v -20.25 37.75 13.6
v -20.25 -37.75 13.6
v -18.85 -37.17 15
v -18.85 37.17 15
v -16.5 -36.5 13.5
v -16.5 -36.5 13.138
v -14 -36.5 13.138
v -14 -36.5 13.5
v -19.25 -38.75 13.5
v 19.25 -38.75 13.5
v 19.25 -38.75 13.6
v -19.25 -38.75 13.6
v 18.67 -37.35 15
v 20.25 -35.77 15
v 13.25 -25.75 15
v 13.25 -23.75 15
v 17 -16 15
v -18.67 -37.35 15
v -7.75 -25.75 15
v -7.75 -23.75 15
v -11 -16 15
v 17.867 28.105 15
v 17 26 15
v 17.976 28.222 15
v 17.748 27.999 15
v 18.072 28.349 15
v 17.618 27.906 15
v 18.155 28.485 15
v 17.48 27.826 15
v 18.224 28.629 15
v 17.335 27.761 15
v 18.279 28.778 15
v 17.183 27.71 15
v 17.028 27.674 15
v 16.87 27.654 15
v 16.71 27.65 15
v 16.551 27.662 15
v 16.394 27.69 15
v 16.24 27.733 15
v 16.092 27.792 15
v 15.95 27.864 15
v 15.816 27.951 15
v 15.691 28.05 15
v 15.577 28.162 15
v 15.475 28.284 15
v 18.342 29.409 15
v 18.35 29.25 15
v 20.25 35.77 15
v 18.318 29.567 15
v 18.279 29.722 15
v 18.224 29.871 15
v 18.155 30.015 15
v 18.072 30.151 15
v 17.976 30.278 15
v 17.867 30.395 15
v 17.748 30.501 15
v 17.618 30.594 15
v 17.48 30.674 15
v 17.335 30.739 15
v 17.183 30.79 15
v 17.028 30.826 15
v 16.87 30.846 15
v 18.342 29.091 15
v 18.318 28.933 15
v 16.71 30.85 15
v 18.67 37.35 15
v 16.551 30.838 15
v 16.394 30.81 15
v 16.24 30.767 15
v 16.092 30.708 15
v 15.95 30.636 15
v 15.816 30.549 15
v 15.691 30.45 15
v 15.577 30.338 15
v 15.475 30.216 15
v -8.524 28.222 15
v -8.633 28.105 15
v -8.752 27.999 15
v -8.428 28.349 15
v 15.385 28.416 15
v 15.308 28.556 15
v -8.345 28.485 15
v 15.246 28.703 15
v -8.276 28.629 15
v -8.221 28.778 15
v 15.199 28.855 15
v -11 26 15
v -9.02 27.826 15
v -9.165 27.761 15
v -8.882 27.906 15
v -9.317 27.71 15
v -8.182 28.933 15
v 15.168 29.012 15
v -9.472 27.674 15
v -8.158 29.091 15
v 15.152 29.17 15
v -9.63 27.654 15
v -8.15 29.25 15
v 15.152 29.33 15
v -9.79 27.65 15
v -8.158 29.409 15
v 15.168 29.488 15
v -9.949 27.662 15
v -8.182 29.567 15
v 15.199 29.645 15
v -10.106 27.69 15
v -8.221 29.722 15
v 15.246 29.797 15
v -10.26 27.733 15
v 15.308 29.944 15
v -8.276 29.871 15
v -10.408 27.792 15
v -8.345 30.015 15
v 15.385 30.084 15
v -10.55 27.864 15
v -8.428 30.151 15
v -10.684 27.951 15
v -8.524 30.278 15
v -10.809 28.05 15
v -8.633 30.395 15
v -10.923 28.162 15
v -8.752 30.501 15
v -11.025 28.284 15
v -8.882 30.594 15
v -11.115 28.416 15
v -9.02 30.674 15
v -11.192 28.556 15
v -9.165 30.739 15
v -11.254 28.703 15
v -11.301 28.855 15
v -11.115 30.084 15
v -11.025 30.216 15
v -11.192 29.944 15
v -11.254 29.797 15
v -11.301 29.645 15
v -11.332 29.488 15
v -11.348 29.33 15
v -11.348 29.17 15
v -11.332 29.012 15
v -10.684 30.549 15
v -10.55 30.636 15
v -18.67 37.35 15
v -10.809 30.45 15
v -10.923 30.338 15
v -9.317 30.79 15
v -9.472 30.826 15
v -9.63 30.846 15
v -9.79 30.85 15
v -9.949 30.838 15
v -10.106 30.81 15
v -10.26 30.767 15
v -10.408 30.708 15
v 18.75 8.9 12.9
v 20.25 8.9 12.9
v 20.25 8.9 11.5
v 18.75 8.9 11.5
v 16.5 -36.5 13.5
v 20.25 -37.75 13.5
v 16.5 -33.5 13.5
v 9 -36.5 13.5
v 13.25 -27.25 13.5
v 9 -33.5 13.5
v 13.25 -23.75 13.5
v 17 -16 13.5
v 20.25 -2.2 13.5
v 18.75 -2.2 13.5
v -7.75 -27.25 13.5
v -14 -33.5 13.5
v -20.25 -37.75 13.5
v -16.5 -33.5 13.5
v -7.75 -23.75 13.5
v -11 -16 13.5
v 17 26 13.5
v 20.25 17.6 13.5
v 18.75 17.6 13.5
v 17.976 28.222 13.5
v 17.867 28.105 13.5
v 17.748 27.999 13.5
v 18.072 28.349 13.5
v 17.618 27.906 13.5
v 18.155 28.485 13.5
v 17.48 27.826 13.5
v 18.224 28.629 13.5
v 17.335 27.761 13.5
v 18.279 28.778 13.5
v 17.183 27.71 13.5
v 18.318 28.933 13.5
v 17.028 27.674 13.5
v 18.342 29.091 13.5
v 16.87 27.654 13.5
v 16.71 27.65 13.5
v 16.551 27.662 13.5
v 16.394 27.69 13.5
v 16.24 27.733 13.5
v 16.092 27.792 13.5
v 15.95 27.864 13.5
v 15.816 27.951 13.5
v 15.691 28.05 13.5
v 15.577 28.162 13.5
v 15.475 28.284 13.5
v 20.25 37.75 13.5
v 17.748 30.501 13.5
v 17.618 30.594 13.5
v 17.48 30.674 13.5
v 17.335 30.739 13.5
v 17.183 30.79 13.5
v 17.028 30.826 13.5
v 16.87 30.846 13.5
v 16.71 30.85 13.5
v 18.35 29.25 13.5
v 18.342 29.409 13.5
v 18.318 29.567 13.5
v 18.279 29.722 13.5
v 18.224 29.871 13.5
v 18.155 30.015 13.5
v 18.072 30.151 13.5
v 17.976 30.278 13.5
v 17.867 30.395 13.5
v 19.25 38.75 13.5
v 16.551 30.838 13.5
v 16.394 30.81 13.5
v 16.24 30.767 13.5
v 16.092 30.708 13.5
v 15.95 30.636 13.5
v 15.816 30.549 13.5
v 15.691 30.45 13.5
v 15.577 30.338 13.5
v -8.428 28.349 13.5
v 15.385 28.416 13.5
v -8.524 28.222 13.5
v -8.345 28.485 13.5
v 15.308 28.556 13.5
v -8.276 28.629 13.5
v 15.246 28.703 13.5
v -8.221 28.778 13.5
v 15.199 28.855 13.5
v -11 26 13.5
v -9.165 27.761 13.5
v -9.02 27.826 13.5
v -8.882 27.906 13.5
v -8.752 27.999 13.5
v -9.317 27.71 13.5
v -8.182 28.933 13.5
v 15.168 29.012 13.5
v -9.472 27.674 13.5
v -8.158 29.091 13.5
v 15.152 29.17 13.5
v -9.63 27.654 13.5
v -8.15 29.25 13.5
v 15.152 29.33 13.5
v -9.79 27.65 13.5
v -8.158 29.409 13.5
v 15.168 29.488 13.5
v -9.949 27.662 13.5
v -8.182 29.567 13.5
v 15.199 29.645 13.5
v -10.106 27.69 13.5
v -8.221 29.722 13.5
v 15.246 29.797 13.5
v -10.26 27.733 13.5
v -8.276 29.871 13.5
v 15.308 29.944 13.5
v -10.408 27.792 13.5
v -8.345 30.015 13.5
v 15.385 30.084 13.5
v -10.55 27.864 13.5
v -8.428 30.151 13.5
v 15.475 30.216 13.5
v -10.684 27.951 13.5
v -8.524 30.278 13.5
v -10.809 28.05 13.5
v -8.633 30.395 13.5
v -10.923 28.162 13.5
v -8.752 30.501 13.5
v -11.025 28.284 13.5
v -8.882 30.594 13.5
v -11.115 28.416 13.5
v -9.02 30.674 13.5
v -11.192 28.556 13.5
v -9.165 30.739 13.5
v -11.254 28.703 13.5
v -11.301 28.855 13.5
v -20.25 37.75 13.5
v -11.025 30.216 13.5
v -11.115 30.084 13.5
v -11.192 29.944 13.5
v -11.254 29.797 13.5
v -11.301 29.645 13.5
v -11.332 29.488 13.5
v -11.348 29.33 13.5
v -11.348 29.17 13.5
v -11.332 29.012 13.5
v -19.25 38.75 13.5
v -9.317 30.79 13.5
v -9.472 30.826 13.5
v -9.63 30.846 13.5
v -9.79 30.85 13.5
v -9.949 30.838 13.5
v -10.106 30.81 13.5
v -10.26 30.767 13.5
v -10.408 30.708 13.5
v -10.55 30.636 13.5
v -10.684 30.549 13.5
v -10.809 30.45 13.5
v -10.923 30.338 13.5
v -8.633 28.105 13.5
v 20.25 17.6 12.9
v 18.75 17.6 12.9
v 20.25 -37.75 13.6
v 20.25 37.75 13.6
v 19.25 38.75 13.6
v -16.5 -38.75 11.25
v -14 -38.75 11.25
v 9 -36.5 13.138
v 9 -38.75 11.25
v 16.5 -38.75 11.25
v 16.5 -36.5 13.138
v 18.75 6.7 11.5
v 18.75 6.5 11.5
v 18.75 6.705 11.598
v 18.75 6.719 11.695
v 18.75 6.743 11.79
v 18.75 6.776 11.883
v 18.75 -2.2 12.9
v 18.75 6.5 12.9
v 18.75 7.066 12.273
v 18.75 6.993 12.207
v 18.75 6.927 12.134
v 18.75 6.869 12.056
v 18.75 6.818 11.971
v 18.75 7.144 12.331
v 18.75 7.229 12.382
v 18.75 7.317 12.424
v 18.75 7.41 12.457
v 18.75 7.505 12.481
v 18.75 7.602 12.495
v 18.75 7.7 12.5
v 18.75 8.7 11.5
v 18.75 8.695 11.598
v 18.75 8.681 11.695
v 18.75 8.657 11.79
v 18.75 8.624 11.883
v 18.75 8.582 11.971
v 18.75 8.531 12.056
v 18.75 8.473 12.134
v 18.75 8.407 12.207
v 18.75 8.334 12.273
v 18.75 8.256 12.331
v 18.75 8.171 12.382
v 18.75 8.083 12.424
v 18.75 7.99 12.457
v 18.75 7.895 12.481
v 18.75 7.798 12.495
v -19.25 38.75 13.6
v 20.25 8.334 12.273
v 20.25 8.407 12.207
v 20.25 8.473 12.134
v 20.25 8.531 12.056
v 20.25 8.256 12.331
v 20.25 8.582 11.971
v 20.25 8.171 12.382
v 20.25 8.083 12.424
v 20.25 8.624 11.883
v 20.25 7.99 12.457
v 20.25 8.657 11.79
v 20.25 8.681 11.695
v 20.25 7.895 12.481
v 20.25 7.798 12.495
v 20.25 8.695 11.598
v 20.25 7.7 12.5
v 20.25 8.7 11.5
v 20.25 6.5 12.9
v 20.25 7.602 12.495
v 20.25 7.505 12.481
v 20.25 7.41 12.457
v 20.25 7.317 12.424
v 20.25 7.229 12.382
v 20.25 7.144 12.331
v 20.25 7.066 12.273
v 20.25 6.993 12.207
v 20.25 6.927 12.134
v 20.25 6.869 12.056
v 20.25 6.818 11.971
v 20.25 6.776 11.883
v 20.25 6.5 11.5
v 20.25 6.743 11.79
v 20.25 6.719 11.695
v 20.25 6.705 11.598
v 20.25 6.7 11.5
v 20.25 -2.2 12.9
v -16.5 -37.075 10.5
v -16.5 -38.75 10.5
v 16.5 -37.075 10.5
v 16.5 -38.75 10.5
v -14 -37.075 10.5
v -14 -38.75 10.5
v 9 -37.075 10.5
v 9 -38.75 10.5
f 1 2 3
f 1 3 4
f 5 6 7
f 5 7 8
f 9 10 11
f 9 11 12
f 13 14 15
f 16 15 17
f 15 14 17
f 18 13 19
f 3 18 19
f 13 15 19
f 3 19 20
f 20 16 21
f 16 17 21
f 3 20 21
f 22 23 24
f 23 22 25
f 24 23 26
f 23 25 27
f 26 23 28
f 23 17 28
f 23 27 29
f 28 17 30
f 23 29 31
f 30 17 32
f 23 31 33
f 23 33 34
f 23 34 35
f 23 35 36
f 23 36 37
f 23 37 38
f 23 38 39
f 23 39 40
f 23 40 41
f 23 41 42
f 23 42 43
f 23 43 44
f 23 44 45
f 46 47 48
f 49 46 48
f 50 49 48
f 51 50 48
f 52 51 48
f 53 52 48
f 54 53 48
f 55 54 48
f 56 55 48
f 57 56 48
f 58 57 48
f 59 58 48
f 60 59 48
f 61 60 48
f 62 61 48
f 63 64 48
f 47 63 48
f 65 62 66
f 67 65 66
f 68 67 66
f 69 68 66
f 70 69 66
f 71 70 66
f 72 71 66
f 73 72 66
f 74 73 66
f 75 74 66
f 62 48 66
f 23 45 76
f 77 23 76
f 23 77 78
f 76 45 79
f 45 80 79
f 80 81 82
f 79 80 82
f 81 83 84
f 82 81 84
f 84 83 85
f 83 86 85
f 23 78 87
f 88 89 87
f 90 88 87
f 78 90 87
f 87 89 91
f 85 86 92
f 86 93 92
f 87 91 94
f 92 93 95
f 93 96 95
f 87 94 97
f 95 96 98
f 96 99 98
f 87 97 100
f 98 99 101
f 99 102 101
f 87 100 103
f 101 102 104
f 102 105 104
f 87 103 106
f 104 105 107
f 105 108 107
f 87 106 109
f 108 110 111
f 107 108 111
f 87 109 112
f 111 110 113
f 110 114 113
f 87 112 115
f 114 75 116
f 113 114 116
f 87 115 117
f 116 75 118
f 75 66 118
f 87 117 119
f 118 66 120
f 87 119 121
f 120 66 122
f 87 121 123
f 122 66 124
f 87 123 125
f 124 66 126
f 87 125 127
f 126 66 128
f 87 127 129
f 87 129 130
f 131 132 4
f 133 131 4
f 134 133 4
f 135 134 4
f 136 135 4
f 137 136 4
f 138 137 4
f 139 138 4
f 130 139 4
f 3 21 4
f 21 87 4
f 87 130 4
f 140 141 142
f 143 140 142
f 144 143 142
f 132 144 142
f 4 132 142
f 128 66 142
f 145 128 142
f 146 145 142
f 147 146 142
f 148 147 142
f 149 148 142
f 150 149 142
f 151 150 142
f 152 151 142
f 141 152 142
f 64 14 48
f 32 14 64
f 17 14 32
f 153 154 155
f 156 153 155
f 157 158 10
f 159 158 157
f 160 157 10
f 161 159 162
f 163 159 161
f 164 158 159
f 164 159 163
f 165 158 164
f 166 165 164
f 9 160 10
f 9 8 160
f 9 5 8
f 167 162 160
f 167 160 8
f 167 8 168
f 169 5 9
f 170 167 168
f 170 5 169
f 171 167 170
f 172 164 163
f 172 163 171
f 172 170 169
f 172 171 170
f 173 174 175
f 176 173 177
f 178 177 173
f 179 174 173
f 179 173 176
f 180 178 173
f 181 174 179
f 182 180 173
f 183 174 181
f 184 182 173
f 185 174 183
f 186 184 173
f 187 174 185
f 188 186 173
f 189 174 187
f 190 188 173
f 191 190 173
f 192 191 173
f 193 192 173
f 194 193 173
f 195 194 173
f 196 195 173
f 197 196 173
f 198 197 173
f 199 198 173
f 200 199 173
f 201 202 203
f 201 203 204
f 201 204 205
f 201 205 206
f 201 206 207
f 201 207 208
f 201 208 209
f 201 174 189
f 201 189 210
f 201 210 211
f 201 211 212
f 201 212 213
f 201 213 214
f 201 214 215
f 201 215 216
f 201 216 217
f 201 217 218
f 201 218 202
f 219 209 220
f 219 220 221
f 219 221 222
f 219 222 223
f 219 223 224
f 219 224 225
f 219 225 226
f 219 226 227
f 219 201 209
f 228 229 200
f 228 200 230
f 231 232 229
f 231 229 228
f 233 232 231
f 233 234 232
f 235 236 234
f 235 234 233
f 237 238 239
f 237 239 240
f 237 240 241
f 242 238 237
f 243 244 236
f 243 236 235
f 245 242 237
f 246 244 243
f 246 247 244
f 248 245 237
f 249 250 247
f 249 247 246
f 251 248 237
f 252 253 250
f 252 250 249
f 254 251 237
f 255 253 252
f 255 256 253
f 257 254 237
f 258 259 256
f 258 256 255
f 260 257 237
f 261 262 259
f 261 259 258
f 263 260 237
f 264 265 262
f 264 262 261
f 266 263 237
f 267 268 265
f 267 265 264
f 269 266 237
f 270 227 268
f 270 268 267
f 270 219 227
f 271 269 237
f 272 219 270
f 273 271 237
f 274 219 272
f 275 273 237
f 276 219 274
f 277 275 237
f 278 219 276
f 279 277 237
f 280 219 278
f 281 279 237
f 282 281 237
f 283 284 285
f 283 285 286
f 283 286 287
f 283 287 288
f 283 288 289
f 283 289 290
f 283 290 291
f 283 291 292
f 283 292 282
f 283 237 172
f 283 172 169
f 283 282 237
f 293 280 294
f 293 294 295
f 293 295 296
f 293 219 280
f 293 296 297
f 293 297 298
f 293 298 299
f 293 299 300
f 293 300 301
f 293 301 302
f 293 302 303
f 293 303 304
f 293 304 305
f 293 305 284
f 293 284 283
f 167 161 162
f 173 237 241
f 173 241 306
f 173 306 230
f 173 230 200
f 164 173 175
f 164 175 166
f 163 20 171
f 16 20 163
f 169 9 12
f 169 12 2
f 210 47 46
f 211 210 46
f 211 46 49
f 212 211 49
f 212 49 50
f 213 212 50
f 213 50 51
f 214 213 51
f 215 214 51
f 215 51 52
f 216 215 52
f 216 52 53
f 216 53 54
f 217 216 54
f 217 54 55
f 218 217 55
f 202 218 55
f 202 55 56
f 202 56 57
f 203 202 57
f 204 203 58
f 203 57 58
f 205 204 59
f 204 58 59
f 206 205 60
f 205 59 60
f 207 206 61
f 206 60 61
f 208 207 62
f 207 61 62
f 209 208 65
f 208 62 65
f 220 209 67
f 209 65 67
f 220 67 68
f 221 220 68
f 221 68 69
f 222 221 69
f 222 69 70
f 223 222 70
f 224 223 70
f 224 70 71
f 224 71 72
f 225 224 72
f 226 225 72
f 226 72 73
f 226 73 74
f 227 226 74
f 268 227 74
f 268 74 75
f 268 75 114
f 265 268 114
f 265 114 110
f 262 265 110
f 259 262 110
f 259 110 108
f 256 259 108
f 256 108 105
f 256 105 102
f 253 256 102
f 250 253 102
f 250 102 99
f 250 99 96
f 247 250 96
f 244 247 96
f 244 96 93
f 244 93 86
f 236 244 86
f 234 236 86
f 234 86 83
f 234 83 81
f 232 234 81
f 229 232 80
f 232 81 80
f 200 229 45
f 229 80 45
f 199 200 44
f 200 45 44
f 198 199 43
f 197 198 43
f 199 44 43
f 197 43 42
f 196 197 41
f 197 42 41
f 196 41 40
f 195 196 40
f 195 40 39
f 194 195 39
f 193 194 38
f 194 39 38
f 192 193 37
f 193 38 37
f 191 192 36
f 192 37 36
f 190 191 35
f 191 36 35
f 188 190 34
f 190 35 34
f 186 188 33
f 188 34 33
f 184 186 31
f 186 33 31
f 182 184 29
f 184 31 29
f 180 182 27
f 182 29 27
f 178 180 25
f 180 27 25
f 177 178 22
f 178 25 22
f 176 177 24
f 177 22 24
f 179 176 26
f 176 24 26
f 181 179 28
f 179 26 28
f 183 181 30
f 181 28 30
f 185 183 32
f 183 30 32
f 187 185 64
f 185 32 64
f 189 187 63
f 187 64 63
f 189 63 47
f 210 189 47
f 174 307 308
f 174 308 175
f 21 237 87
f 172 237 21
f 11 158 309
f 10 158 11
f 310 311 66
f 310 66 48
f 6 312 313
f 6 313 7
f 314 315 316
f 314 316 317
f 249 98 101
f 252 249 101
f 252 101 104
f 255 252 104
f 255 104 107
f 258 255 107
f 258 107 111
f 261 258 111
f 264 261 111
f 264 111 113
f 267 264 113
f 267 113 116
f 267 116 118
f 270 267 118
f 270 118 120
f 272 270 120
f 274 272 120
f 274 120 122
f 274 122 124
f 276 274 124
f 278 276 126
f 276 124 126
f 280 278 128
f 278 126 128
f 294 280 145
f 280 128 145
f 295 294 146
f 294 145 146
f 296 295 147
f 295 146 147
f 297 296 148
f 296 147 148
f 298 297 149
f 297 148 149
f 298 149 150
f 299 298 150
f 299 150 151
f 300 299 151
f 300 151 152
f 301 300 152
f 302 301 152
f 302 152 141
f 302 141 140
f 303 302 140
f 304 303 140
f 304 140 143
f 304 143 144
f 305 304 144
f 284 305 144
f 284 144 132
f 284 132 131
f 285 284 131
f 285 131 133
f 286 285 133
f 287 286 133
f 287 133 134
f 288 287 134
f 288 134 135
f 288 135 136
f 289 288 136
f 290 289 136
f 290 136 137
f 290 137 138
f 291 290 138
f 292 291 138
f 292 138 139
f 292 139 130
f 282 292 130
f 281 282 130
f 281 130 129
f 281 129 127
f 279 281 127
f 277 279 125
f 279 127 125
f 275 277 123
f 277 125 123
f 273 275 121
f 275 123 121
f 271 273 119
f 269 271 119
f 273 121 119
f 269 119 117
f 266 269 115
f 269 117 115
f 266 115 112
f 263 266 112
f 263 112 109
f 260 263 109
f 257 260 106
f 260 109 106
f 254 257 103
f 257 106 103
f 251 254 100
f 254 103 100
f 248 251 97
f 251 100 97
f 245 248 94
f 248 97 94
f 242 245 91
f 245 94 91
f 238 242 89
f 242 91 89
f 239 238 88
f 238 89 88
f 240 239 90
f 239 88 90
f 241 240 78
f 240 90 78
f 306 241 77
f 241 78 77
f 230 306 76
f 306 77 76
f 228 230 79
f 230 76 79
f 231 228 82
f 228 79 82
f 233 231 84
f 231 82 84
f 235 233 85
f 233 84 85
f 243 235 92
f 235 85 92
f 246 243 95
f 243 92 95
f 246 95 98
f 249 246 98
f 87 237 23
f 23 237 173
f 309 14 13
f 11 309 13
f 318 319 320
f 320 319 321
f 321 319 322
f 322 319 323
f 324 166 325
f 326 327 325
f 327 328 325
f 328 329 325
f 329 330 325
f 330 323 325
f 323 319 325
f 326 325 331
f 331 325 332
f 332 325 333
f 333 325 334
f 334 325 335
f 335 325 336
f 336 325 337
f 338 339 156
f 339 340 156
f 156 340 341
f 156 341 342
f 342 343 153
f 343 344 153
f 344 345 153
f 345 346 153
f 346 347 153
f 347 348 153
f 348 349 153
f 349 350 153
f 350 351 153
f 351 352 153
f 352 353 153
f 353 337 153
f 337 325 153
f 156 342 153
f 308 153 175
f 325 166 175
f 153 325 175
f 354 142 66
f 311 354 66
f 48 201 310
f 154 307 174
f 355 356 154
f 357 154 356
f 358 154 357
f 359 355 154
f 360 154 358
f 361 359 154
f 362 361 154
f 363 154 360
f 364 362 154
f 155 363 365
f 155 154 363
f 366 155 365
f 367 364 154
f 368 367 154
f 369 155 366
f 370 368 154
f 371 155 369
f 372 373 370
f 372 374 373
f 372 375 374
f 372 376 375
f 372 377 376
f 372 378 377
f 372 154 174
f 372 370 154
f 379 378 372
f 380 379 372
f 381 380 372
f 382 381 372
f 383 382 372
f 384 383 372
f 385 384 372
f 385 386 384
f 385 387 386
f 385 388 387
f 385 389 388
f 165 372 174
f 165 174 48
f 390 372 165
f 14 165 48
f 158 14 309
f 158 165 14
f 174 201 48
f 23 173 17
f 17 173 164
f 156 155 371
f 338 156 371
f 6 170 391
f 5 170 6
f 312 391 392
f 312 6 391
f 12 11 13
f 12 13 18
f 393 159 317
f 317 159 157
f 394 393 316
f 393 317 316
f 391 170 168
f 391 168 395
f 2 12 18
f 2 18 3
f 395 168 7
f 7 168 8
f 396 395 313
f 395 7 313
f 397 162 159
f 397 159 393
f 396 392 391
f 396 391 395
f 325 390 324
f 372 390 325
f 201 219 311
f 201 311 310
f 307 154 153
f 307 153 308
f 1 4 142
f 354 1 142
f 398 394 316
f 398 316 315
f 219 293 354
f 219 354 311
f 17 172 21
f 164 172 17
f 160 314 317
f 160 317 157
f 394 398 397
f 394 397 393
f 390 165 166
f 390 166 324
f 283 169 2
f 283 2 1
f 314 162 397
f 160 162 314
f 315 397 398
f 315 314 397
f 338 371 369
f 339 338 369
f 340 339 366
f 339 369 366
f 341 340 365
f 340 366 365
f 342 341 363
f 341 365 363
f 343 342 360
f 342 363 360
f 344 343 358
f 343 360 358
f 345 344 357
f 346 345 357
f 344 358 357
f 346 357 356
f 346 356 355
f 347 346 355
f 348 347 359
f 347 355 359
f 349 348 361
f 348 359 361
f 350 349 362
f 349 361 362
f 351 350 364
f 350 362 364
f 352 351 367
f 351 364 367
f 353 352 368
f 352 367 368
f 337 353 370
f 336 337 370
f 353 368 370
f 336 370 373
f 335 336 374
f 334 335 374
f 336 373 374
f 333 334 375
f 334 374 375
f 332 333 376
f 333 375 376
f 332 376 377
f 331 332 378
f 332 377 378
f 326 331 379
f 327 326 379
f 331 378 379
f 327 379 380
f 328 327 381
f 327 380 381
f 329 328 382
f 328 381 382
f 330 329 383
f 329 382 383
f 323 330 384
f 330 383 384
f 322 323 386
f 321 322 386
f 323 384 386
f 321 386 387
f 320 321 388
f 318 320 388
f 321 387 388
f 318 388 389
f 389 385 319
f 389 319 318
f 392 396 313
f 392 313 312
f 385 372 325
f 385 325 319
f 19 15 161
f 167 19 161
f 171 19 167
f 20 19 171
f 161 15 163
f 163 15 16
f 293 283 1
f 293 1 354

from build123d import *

# Parameters (mm, degrees)
PAD014_DEPTH       = 1.5
SKETCH020_W        = 2.5
SKETCH020_H        = 5.25
SKETCH020_W_2      = 7.5
PAD015_DEPTH       = 3
POCKET012015_DEPTH = 36.751
SKETCH024_R        = 1.6
POCKET012016_DEPTH = 4.501
SKETCH026_W        = 21
SKETCH026_H        = 2
POCKET012017_DEPTH = 4.501
POCKET012018_DEPTH = 21
SKETCH038_W        = 28
SKETCH038_H        = 42
POCKET012019_DEPTH = 1.501
PAD017_DEPTH       = 1.5
CHAMFER001_SIZE    = 1.4


with BuildPart() as part:
    # Sketch016 → Pad014 (new body)
    with BuildSketch(Plane.XY.offset(13.5)):
        Polygon((-19.25, 38.75), (19.25, 38.75), (20.25, 37.75), (20.25, -37.75), (19.25, -38.75), (-19.25, -38.75), (-20.25, -37.75), (-20.25, 37.75), align=None)
    extrude(amount=PAD014_DEPTH)

    # Sketch020 → Pad015 (new body)
    with BuildSketch(Plane(origin=(0, 0, 13.5), x_dir=(1, 0, 0), z_dir=(0, 0, -1))):
        with Locations((-15.25, 36.125)):
            Rectangle(SKETCH020_W, SKETCH020_H)
        with Locations((12.75, 36.125)):
            Rectangle(SKETCH020_W_2, SKETCH020_H)
    extrude(amount=PAD015_DEPTH)

    # Sketch021 → Pocket012015 (cut, through all)
    with BuildSketch(Plane(origin=(-16.5, 0, 13.5), x_dir=(0, -1, 0), z_dir=(-1, 0, 0))):
        Polygon((36.5, 0), (38.75, 0), (38.75, -2.25), (36.5, -0.362026), align=None)
        Polygon((33.5, 0), (37.075261, -3), (33.5, -3), align=None)
    extrude(amount=-POCKET012015_DEPTH, mode=Mode.SUBTRACT)

    # Sketch024 → Pocket012016 (cut, through all)
    with BuildSketch(Plane.XY.offset(15)):
        with Locations((-9.75, 29.25)):
            Circle(SKETCH024_R)
        with Locations((16.75, 29.25)):
            Circle(SKETCH024_R)
    extrude(amount=-POCKET012016_DEPTH, mode=Mode.SUBTRACT)

    # Sketch026 → Pocket012017 (cut, through all)
    with BuildSketch(Plane.XY.offset(15)):
        with Locations((2.75, -24.75)):
            Rectangle(SKETCH026_W, SKETCH026_H)
    extrude(amount=-POCKET012017_DEPTH, mode=Mode.SUBTRACT)

    # Sketch027 → Pocket012018 (cut)
    with BuildSketch(Plane(origin=(13.25, 0, 13.5), x_dir=(0, -1, 0), z_dir=(-1, 0, 0))):
        Polygon((25.75, 1.5), (27.25, 0), (25.75, 0), align=None)
    extrude(amount=POCKET012018_DEPTH, mode=Mode.SUBTRACT)

    # Sketch038 → Pocket012019 (cut, through all)
    with BuildSketch(Plane(origin=(0, 0, 13.5), x_dir=(1, 0, 0), z_dir=(0, 0, -1))):
        with Locations((3, -5)):
            Rectangle(SKETCH038_W, SKETCH038_H)
    extrude(amount=-POCKET012019_DEPTH, mode=Mode.SUBTRACT)

    # Sketch040 → Pad017 (new body)
    with BuildSketch(Plane(origin=(20.25, 0, 13.5), x_dir=(0, 1, 0), z_dir=(1, 0, 0))):
        with BuildLine():
            Line((17.6, 0), (-2.2, 0))
            Line((-2.2, 0), (-2.2, -0.6))
            Line((-2.2, -0.6), (6.5, -0.6))
            Line((6.5, -0.6), (6.5, -2))
            Line((6.5, -2), (6.7, -2))
            ThreePointArc((8.7, -2), (7.7, -1), (6.7, -2))
            Line((8.9, -2), (8.7, -2))
            Line((8.9, -0.6), (8.9, -2))
            Line((8.9, -0.6), (17.6, -0.6))
            Line((17.6, -0.6), (17.6, 0))
        make_face()
    extrude(amount=-PAD017_DEPTH)

    # Chamfer001
    chamfer001_edges = [part.edges().sort_by_distance(p)[0] for p in [
        (19.75, 38.25, 15),
        (0, 38.75, 15),
        (-19.75, 38.25, 15),
        (-20.25, 0, 15),
        (-19.75, -38.25, 15),
        (0, -38.75, 15),
        (19.75, -38.25, 15),
    ]]
    chamfer(chamfer001_edges, length=CHAMFER001_SIZE)


solid = part.part
